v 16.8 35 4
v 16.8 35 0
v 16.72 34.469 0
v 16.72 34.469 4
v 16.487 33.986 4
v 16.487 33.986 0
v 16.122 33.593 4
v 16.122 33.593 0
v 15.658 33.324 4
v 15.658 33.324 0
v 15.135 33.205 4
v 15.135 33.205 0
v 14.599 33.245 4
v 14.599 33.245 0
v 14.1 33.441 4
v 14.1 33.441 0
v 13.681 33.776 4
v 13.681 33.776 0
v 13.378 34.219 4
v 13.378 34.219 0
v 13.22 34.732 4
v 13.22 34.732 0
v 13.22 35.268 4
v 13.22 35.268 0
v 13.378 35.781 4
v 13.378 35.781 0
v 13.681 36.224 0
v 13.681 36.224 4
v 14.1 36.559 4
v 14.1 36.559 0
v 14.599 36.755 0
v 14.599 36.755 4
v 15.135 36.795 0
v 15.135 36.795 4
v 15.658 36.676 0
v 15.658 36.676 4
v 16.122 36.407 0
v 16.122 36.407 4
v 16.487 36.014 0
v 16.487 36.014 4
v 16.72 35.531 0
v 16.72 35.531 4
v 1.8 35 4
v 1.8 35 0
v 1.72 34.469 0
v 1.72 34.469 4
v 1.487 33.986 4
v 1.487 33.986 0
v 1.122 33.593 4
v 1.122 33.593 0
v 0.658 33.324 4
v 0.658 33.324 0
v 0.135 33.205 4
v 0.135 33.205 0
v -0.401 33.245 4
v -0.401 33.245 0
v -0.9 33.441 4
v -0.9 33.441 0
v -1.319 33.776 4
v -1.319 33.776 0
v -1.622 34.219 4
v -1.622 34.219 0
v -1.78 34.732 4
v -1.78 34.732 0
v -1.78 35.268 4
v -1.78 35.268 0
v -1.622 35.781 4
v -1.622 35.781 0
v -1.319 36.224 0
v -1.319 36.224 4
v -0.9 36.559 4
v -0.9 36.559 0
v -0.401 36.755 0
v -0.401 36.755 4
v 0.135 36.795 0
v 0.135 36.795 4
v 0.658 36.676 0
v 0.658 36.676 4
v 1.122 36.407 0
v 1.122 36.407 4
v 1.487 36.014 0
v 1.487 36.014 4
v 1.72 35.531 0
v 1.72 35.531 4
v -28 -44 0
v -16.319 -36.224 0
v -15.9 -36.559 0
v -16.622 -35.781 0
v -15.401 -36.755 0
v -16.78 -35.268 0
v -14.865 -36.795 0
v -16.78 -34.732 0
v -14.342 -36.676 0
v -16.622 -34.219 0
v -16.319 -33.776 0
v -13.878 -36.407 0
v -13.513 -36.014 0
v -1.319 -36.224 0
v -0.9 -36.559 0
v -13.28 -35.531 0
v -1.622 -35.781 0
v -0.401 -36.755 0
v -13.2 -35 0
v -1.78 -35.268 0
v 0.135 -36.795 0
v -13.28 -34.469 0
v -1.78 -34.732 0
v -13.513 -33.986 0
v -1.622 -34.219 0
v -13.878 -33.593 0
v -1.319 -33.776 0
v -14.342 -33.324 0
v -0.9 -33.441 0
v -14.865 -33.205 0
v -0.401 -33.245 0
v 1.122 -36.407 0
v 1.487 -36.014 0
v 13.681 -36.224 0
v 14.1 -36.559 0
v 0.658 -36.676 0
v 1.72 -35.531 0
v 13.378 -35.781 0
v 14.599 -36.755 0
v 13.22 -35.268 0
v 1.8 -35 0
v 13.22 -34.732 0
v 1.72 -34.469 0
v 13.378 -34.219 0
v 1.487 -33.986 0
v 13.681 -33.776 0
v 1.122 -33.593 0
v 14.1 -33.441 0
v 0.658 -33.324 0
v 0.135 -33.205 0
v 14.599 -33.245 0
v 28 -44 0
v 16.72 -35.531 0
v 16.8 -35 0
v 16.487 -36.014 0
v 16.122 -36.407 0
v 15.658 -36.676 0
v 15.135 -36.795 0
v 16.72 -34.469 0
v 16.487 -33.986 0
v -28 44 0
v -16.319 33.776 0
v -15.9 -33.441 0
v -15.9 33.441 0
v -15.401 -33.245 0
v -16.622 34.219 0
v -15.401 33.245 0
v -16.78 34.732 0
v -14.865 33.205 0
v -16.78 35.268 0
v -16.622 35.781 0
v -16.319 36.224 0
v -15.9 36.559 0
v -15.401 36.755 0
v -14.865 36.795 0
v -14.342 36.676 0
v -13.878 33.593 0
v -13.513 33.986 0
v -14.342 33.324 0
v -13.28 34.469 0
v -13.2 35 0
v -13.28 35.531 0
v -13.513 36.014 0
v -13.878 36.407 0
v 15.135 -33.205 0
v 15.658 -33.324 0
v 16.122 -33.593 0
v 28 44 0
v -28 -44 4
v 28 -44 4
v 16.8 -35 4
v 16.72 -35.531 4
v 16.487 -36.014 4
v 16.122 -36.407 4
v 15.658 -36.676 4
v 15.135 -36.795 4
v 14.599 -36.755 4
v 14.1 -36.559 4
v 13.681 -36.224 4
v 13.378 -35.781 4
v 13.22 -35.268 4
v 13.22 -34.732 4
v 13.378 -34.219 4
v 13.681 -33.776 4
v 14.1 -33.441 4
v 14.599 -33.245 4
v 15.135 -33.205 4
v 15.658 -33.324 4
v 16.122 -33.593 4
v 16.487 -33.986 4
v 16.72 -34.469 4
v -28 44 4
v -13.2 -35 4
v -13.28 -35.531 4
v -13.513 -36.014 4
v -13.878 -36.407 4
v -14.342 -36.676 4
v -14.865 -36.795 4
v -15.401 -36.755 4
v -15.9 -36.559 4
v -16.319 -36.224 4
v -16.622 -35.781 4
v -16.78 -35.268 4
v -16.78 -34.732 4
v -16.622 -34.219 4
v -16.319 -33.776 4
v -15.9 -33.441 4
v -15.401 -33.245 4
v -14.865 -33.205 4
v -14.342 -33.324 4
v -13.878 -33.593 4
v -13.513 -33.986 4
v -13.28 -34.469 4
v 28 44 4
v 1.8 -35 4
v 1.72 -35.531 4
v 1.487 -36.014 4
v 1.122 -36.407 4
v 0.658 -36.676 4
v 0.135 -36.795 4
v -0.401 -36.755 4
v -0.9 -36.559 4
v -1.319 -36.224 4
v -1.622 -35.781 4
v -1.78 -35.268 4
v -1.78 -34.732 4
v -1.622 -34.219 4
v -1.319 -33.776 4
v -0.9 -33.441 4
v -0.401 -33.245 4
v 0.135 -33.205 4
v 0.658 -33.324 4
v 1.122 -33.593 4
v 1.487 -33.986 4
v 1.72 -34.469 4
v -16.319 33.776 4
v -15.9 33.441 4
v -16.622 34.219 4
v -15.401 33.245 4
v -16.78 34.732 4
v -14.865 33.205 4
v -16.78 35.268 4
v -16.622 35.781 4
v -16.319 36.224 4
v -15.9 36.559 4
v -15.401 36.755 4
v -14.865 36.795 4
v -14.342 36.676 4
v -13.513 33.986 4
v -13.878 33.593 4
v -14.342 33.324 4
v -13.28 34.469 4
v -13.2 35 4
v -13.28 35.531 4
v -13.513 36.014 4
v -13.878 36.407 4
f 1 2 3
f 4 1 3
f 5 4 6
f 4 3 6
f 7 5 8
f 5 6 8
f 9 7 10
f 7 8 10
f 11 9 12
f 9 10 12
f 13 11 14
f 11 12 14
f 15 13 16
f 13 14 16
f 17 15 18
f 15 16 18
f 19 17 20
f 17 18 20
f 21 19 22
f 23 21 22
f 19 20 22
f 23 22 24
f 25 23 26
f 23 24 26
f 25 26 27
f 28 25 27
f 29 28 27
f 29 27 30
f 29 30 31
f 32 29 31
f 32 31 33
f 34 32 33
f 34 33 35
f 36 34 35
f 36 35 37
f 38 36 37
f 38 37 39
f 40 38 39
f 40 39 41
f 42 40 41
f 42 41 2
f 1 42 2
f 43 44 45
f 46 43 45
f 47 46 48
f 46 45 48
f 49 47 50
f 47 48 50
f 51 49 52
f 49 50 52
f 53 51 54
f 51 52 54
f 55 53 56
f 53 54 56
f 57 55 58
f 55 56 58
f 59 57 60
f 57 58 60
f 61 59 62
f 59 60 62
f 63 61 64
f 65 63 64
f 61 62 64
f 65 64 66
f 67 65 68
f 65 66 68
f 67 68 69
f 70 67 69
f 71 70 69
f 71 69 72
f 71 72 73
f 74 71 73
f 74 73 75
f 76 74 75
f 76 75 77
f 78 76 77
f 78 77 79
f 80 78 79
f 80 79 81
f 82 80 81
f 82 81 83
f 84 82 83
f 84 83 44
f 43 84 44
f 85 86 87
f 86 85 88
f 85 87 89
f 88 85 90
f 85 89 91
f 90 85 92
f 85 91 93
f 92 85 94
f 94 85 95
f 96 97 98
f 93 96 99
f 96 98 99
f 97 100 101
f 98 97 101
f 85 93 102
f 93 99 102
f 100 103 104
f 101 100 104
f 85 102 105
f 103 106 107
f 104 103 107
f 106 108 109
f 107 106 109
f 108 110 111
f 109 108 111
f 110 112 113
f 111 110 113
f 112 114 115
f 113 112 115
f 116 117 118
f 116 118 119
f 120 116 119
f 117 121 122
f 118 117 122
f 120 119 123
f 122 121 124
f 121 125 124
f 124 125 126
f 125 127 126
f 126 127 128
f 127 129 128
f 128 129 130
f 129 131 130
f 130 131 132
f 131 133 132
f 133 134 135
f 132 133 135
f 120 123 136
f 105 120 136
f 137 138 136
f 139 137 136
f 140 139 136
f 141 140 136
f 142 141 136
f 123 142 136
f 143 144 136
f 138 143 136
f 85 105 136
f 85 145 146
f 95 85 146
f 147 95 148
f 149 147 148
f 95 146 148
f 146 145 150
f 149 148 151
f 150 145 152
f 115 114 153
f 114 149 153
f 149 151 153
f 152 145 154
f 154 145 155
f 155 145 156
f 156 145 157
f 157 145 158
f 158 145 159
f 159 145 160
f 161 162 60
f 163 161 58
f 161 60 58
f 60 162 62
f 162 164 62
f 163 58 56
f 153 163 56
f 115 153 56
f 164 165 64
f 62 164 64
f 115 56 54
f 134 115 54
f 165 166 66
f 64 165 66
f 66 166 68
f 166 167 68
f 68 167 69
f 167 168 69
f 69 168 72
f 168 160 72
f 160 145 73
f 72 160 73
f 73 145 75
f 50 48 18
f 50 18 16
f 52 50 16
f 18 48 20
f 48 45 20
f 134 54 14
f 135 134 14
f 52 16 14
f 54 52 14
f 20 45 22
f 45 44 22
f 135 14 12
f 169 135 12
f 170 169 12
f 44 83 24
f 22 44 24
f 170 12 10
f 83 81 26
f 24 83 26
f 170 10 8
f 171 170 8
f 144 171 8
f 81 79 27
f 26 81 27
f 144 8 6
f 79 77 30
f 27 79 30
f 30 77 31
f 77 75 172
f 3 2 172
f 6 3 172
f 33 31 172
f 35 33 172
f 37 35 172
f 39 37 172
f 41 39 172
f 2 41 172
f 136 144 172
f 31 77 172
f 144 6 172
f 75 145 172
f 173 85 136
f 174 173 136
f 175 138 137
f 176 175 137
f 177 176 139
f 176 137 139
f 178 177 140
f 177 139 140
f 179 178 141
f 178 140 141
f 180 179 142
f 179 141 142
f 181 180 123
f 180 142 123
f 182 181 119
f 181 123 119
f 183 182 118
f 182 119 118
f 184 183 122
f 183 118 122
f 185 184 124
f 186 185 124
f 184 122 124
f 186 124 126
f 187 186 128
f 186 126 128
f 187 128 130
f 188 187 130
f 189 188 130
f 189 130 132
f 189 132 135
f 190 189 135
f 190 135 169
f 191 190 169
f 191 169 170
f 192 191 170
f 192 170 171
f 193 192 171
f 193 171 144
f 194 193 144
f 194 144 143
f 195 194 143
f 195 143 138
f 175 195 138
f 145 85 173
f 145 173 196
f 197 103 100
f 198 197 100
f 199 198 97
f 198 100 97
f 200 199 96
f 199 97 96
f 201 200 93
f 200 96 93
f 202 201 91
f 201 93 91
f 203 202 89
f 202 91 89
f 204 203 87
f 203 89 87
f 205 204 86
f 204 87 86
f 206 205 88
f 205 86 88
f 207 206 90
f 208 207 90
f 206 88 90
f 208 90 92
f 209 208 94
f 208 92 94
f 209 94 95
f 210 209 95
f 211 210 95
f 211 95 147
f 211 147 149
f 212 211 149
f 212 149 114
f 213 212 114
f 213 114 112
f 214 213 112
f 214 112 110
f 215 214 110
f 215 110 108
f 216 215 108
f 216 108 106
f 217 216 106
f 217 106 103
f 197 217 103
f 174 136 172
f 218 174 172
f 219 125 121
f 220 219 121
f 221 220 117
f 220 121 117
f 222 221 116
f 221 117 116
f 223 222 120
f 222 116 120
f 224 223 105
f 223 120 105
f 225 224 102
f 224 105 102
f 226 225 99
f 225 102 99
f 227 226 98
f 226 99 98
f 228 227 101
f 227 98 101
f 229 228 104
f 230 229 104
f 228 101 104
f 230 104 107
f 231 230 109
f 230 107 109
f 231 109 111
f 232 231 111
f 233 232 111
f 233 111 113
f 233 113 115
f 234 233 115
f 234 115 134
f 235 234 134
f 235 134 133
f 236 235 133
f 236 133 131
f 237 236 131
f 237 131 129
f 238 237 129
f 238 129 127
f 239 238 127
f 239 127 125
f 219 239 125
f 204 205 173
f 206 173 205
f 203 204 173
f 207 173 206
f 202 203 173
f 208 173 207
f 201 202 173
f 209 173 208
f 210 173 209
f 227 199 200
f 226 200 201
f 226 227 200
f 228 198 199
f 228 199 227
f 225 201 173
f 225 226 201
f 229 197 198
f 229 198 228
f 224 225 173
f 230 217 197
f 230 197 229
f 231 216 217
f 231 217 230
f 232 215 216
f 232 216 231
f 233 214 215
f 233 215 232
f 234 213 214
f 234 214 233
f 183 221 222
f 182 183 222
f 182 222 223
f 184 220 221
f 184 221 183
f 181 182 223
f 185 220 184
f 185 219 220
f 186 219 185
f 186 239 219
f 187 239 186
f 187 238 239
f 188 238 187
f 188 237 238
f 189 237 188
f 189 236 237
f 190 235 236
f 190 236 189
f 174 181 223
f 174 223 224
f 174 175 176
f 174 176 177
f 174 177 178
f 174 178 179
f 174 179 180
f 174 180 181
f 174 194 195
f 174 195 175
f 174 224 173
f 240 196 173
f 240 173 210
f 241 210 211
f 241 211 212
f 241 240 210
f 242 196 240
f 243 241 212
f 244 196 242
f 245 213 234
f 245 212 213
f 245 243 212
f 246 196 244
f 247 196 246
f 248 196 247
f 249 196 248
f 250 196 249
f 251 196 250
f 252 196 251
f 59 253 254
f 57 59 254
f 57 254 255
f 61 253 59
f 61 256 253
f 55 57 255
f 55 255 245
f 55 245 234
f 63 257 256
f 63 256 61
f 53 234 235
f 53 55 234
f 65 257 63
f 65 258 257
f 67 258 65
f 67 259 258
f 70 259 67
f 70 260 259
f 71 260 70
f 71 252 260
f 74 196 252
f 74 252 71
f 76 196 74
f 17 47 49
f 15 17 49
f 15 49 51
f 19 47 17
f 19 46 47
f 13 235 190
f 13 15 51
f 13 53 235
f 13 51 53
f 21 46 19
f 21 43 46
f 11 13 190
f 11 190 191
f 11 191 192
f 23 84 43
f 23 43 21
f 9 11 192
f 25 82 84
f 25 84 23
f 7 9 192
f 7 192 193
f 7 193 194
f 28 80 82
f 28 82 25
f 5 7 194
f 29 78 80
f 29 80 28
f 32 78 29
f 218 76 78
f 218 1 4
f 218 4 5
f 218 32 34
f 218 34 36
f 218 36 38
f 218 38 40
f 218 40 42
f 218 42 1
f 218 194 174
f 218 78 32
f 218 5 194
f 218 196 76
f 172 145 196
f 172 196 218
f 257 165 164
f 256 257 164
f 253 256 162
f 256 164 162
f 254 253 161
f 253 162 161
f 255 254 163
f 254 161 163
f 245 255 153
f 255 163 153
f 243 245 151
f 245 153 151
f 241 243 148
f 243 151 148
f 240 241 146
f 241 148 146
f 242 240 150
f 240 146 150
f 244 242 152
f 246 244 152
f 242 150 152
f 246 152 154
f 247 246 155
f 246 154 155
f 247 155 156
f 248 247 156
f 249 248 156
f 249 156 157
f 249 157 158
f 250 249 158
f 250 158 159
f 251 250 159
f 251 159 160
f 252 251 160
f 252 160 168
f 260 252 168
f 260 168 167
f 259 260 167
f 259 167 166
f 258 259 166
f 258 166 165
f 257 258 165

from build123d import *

# Parameters (mm, degrees)
SKETCH_W        = 56
SKETCH_H        = 88
PAD_DEPTH       = 4
SKETCH004_R     = 1.8
POCKET001_DEPTH = 5


with BuildPart() as part:
    # Sketch → Pad (new body)
    with BuildSketch(Plane.XY):
        Rectangle(SKETCH_W, SKETCH_H)
    extrude(amount=PAD_DEPTH)

    # Sketch004 → Pocket001 (cut)
    with BuildSketch(Plane(origin=(0, 0, 0), x_dir=(1, 0, 0), z_dir=(0, 0, -1))):
        with Locations((0, -35)):
            Circle(SKETCH004_R)
        with Locations((15, -35)):
            Circle(SKETCH004_R)
        with Locations((-15, -35)):
            Circle(SKETCH004_R)
        with Locations((15, 35)):
            Circle(SKETCH004_R)
        with Locations((0, 35)):
            Circle(SKETCH004_R)
        with Locations((-15, 35)):
            Circle(SKETCH004_R)
    extrude(amount=-POCKET001_DEPTH, mode=Mode.SUBTRACT)


solid = part.part
